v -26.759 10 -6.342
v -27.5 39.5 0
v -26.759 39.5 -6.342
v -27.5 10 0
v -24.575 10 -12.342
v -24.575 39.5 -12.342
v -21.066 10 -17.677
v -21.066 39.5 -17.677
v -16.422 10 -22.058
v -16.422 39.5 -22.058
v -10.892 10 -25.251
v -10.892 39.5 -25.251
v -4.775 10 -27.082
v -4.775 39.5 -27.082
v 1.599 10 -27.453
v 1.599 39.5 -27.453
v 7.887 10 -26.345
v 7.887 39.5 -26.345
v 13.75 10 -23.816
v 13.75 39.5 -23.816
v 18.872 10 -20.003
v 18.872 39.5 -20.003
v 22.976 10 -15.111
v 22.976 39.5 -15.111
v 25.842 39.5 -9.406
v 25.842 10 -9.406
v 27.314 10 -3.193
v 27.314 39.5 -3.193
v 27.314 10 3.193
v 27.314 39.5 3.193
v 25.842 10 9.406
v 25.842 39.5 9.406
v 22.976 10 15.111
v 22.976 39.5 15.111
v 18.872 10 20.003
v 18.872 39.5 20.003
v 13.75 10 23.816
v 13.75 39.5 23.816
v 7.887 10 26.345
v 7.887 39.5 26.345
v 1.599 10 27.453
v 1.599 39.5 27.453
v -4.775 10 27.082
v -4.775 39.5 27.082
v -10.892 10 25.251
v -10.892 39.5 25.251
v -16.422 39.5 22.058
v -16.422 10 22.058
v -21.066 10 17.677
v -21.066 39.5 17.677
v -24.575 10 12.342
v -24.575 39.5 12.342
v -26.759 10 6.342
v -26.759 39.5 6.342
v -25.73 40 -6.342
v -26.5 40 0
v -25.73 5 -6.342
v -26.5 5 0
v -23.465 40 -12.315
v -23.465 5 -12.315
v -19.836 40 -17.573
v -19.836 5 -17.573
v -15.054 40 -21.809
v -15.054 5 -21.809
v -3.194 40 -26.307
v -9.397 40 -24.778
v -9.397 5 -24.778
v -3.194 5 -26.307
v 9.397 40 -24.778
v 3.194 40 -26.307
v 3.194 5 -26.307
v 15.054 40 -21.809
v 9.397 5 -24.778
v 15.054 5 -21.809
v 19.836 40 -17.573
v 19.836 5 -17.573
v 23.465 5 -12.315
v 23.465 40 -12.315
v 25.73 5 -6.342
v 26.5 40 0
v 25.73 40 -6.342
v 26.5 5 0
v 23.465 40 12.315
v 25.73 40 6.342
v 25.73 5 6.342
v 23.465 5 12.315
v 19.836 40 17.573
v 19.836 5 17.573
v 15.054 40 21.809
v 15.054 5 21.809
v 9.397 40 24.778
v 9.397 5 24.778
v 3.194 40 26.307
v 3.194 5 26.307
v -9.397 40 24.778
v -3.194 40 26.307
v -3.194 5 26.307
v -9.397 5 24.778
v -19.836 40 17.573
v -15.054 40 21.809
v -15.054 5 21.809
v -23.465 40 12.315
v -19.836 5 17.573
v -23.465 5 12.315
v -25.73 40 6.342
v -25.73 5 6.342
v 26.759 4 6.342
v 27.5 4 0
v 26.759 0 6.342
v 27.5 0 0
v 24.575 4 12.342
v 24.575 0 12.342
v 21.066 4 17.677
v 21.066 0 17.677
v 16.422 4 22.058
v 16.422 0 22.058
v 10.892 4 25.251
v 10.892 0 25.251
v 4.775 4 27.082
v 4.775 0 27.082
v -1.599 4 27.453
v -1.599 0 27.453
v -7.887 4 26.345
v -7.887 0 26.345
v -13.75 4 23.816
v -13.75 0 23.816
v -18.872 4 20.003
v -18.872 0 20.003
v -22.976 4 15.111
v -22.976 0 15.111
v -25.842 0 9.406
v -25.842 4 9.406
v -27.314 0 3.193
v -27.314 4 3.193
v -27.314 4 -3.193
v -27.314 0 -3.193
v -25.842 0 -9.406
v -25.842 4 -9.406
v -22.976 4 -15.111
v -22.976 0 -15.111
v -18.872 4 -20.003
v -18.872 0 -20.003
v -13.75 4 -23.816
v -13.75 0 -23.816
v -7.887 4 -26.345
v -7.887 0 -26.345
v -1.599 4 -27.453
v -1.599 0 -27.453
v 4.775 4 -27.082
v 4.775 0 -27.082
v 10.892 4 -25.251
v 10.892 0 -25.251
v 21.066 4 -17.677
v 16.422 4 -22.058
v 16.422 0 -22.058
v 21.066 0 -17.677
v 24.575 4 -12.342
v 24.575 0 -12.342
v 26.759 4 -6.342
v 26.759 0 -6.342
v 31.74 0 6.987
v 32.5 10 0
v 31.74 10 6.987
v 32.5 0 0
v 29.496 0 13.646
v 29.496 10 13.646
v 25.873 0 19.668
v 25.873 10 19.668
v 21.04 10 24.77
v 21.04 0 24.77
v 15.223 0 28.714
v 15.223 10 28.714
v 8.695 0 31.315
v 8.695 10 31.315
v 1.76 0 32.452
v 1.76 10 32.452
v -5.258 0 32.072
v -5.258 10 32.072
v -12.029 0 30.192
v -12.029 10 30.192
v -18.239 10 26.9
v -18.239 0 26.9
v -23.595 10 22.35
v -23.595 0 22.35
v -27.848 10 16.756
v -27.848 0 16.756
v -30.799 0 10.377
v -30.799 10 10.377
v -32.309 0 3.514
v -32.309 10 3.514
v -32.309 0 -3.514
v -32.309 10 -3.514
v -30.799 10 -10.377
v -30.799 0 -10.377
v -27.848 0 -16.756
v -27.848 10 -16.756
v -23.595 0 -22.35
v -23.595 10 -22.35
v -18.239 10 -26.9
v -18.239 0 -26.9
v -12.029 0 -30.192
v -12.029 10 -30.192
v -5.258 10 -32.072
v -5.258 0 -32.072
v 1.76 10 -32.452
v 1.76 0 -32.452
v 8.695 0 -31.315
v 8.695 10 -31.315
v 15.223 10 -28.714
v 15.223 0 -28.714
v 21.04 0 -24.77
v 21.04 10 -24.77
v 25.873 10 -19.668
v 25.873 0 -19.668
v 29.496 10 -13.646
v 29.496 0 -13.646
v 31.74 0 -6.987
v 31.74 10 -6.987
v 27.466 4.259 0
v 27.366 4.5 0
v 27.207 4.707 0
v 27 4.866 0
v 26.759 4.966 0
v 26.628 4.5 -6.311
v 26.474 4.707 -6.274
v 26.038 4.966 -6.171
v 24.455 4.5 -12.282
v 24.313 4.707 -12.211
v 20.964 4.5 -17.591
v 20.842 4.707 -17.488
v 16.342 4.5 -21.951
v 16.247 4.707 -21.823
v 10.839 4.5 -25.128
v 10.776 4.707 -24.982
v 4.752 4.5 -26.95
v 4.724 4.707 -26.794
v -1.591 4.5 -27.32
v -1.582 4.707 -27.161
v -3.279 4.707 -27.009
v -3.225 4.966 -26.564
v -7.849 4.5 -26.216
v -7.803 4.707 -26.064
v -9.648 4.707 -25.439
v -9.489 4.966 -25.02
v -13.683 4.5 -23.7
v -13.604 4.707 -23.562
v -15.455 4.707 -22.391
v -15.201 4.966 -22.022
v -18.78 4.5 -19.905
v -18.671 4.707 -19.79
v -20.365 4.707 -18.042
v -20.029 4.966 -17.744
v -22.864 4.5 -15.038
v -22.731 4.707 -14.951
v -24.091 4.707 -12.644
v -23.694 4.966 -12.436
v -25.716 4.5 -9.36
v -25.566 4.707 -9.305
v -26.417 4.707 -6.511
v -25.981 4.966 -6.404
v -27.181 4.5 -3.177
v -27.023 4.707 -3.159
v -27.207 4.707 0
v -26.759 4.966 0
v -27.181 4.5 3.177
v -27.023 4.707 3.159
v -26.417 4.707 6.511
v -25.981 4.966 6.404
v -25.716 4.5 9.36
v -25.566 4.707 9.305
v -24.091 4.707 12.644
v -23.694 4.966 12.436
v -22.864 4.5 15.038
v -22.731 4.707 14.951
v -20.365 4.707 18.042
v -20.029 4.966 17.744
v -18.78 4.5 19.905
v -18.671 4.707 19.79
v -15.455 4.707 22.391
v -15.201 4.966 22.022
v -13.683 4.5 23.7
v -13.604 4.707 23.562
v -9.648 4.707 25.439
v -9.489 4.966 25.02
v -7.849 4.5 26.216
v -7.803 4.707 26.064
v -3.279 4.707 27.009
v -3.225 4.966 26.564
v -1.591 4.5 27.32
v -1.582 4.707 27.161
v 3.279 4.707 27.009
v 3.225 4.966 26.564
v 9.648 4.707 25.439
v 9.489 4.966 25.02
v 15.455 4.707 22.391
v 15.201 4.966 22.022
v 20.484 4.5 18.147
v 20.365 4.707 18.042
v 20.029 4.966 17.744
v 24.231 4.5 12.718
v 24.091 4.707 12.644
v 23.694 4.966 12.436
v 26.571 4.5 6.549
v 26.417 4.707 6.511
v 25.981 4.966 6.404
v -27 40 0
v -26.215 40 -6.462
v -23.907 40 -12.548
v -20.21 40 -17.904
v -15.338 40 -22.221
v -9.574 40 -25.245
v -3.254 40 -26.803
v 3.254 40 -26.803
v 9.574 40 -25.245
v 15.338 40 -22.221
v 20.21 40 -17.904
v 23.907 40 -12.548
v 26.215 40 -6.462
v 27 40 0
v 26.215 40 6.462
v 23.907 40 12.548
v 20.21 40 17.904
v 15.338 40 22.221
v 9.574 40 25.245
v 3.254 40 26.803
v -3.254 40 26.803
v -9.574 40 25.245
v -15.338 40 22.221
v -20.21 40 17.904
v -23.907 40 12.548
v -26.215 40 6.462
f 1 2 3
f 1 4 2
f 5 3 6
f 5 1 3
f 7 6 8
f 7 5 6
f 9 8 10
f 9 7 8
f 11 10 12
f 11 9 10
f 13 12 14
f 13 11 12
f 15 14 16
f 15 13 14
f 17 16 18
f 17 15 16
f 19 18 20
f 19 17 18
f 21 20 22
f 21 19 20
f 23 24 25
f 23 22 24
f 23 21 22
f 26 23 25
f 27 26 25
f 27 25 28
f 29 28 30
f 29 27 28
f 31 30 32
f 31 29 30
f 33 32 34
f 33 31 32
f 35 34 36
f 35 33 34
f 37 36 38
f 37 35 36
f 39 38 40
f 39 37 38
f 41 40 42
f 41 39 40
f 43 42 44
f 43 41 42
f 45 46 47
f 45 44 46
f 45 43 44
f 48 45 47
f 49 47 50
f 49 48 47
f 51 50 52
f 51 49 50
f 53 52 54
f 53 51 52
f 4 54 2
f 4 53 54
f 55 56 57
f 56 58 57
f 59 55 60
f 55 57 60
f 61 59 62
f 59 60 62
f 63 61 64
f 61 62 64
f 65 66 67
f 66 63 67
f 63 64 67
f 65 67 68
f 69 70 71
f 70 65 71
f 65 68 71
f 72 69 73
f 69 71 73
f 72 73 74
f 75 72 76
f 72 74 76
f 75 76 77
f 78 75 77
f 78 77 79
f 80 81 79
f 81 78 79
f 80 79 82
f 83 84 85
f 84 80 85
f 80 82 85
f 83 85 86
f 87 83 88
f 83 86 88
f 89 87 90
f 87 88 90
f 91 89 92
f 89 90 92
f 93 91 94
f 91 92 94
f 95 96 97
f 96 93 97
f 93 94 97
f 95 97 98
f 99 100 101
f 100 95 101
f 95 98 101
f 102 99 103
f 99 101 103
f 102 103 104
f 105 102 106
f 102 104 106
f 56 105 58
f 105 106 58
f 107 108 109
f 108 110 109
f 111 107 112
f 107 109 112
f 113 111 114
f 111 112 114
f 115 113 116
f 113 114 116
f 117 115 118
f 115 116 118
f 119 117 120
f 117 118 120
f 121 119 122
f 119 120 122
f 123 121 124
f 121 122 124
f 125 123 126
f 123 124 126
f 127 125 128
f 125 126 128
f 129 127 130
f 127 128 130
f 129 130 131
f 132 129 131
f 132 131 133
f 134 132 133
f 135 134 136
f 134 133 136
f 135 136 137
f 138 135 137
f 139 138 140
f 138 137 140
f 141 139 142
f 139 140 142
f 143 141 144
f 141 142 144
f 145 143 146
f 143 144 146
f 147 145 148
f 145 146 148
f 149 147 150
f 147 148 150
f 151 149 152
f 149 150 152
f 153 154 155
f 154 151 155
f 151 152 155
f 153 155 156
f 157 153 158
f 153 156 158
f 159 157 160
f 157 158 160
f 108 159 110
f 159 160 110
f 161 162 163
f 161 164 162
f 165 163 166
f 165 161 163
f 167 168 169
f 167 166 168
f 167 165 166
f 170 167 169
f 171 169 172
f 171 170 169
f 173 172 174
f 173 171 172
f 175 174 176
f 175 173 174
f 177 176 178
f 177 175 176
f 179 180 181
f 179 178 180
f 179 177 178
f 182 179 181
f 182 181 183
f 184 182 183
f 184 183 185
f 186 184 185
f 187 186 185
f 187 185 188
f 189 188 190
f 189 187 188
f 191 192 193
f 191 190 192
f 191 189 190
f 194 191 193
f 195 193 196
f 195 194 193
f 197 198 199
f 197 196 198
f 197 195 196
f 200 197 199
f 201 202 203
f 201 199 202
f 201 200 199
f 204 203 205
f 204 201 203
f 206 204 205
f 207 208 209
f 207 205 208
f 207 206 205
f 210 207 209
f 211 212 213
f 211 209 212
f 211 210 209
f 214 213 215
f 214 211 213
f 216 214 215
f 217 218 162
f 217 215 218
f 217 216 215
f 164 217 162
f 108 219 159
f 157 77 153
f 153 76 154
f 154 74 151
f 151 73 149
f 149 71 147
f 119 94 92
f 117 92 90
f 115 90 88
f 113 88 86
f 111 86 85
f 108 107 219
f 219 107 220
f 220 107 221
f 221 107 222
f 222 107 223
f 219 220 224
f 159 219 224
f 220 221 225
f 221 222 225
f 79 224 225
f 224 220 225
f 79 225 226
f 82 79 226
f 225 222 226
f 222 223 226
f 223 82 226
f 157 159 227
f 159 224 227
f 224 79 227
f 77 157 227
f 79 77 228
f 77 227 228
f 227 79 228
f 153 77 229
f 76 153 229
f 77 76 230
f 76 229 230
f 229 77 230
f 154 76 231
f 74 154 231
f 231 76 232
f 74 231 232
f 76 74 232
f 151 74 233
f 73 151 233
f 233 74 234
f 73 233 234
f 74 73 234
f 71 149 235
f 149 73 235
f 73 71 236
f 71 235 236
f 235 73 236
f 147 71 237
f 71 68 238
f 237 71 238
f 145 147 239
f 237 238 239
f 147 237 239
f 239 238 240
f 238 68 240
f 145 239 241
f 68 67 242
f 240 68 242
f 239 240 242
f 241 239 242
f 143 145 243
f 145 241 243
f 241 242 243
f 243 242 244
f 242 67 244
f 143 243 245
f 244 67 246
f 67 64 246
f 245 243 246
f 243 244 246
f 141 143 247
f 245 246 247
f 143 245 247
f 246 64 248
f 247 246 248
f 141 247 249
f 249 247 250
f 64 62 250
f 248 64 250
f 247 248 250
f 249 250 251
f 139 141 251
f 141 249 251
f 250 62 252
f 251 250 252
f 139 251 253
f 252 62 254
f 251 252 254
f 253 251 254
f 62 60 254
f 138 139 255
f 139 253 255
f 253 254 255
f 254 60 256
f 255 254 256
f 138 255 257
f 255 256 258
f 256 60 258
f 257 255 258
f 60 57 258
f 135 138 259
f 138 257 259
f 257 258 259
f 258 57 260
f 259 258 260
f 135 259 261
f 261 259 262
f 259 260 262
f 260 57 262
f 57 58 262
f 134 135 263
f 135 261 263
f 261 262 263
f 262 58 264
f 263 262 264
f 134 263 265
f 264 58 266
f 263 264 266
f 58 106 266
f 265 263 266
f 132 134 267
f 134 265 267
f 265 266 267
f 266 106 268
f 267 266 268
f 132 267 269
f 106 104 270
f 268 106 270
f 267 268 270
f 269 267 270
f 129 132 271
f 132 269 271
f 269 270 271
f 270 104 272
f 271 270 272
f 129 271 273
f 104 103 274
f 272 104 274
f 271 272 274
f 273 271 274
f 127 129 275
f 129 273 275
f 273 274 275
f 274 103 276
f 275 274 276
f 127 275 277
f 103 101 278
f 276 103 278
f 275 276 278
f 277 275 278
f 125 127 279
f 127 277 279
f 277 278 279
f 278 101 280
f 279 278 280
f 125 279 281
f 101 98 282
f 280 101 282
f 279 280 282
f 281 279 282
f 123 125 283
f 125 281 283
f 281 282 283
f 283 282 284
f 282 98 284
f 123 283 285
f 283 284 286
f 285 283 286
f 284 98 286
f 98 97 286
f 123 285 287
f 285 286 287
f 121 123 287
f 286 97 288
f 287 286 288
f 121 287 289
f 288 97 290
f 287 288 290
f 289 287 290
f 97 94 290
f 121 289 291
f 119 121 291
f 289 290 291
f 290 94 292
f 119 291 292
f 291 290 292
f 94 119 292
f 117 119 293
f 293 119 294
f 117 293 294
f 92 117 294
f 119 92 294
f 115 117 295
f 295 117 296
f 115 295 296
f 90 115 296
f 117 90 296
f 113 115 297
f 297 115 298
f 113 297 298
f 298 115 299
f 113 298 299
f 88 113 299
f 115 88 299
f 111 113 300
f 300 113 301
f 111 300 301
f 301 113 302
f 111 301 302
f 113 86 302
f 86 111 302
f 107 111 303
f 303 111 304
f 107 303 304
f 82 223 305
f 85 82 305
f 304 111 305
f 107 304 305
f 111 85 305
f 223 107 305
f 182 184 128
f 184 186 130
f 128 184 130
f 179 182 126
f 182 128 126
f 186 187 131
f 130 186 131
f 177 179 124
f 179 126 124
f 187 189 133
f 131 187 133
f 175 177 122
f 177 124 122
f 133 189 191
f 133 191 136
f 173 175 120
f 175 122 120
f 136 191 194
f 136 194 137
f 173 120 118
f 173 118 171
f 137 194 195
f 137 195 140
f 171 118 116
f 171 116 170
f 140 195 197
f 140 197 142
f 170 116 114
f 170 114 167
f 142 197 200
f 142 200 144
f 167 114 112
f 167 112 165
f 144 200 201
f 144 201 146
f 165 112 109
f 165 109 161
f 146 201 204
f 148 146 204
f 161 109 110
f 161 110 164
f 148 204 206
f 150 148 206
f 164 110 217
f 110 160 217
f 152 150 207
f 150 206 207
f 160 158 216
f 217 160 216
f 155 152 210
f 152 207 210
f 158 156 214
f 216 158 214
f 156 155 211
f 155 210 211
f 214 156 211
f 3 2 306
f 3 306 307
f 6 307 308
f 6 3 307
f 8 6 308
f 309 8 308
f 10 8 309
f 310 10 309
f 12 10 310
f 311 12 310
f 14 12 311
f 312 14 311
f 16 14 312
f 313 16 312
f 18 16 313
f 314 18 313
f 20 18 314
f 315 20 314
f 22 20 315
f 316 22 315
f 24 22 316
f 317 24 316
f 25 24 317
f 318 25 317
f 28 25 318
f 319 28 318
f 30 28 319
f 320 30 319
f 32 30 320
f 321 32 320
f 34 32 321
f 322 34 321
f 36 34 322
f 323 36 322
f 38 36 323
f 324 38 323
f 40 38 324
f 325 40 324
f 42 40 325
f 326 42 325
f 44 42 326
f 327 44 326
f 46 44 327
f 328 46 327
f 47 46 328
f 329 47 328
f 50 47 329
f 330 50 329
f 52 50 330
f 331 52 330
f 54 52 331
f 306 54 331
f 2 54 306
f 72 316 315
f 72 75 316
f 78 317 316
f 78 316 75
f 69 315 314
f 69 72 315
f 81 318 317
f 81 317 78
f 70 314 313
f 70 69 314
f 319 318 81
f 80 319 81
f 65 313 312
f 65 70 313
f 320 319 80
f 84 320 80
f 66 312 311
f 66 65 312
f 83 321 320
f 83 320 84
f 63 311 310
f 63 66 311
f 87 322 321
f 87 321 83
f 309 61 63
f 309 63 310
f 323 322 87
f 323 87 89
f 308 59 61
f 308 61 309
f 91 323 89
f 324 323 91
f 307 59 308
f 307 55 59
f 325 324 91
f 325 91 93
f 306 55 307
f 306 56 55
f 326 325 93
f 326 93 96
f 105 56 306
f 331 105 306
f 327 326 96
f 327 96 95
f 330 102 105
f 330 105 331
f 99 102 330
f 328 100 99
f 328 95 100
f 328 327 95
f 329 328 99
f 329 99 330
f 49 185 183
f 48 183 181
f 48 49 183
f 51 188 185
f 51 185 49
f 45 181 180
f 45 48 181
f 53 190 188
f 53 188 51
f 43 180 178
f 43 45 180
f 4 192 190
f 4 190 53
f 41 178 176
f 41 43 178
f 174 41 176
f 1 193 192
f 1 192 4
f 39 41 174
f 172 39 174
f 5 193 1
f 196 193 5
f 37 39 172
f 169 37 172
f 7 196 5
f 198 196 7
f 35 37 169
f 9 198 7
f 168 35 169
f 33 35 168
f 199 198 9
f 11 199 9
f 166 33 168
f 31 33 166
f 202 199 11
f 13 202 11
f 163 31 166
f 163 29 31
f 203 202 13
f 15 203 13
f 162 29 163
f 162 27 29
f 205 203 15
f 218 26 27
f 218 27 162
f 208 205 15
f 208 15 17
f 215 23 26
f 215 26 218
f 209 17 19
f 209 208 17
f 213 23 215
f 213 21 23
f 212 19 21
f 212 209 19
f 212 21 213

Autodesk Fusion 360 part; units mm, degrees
sketch "Sketch1" plane through (0, 0, 0) normal (0, 1, 0) x (1, 0, 0)
  circle A0 centre (0, 0) radius 32.5
  circle A1 centre (0, 0) radius 28.5
  dimension "d1" = 65
  dimension "d2" = 57
extrude "Extrude1" add sketch "Sketch1" along normal blind 10 makes body 1
sketch "Sketch2" plane through (0, 10, 0) normal (0, 1, 0) x (-1, 0, 0)
  circle A0 centre (0, 0) radius 28.5
  circle A1 centre (0, 0) radius 32.5
  circle A2 centre (0, 0) radius 28.5
  circle A3 centre (0, 0) radius 27.5
  circle A4 centre (0, 0) radius 26.5
  dimension "d5" = -1
  dimension "d8" = -2
extrude "Extrude3" add sketch "Sketch2" along normal blind 30 and the other way blind 5 separate body contours A3 makes body 2
sketch "Sketch3" plane through (0, 0, 0) normal (0, -1, 0) x (1, 0, 0)
  circle A0 centre (0, 0) radius 28.5
  circle A1 centre (0, 0) radius 32.5
  circle A2 centre (0, 0) radius 28.5
  circle A3 centre (0, 0) radius 27.5
extrude "Extrude4" add sketch "Sketch3" against normal blind 10 contours A0 A2 bodies 1 2
fillet "Fillet1" radius 1 1 edges at (25.639, 5, 9.9444) on bodies 1
chamfer "Chamfer1" distance 0.5 angle 45 1 edges at (25.639, 40, -9.9444) on bodies 1
equation "d8 = -1 mm - 1 mm"
